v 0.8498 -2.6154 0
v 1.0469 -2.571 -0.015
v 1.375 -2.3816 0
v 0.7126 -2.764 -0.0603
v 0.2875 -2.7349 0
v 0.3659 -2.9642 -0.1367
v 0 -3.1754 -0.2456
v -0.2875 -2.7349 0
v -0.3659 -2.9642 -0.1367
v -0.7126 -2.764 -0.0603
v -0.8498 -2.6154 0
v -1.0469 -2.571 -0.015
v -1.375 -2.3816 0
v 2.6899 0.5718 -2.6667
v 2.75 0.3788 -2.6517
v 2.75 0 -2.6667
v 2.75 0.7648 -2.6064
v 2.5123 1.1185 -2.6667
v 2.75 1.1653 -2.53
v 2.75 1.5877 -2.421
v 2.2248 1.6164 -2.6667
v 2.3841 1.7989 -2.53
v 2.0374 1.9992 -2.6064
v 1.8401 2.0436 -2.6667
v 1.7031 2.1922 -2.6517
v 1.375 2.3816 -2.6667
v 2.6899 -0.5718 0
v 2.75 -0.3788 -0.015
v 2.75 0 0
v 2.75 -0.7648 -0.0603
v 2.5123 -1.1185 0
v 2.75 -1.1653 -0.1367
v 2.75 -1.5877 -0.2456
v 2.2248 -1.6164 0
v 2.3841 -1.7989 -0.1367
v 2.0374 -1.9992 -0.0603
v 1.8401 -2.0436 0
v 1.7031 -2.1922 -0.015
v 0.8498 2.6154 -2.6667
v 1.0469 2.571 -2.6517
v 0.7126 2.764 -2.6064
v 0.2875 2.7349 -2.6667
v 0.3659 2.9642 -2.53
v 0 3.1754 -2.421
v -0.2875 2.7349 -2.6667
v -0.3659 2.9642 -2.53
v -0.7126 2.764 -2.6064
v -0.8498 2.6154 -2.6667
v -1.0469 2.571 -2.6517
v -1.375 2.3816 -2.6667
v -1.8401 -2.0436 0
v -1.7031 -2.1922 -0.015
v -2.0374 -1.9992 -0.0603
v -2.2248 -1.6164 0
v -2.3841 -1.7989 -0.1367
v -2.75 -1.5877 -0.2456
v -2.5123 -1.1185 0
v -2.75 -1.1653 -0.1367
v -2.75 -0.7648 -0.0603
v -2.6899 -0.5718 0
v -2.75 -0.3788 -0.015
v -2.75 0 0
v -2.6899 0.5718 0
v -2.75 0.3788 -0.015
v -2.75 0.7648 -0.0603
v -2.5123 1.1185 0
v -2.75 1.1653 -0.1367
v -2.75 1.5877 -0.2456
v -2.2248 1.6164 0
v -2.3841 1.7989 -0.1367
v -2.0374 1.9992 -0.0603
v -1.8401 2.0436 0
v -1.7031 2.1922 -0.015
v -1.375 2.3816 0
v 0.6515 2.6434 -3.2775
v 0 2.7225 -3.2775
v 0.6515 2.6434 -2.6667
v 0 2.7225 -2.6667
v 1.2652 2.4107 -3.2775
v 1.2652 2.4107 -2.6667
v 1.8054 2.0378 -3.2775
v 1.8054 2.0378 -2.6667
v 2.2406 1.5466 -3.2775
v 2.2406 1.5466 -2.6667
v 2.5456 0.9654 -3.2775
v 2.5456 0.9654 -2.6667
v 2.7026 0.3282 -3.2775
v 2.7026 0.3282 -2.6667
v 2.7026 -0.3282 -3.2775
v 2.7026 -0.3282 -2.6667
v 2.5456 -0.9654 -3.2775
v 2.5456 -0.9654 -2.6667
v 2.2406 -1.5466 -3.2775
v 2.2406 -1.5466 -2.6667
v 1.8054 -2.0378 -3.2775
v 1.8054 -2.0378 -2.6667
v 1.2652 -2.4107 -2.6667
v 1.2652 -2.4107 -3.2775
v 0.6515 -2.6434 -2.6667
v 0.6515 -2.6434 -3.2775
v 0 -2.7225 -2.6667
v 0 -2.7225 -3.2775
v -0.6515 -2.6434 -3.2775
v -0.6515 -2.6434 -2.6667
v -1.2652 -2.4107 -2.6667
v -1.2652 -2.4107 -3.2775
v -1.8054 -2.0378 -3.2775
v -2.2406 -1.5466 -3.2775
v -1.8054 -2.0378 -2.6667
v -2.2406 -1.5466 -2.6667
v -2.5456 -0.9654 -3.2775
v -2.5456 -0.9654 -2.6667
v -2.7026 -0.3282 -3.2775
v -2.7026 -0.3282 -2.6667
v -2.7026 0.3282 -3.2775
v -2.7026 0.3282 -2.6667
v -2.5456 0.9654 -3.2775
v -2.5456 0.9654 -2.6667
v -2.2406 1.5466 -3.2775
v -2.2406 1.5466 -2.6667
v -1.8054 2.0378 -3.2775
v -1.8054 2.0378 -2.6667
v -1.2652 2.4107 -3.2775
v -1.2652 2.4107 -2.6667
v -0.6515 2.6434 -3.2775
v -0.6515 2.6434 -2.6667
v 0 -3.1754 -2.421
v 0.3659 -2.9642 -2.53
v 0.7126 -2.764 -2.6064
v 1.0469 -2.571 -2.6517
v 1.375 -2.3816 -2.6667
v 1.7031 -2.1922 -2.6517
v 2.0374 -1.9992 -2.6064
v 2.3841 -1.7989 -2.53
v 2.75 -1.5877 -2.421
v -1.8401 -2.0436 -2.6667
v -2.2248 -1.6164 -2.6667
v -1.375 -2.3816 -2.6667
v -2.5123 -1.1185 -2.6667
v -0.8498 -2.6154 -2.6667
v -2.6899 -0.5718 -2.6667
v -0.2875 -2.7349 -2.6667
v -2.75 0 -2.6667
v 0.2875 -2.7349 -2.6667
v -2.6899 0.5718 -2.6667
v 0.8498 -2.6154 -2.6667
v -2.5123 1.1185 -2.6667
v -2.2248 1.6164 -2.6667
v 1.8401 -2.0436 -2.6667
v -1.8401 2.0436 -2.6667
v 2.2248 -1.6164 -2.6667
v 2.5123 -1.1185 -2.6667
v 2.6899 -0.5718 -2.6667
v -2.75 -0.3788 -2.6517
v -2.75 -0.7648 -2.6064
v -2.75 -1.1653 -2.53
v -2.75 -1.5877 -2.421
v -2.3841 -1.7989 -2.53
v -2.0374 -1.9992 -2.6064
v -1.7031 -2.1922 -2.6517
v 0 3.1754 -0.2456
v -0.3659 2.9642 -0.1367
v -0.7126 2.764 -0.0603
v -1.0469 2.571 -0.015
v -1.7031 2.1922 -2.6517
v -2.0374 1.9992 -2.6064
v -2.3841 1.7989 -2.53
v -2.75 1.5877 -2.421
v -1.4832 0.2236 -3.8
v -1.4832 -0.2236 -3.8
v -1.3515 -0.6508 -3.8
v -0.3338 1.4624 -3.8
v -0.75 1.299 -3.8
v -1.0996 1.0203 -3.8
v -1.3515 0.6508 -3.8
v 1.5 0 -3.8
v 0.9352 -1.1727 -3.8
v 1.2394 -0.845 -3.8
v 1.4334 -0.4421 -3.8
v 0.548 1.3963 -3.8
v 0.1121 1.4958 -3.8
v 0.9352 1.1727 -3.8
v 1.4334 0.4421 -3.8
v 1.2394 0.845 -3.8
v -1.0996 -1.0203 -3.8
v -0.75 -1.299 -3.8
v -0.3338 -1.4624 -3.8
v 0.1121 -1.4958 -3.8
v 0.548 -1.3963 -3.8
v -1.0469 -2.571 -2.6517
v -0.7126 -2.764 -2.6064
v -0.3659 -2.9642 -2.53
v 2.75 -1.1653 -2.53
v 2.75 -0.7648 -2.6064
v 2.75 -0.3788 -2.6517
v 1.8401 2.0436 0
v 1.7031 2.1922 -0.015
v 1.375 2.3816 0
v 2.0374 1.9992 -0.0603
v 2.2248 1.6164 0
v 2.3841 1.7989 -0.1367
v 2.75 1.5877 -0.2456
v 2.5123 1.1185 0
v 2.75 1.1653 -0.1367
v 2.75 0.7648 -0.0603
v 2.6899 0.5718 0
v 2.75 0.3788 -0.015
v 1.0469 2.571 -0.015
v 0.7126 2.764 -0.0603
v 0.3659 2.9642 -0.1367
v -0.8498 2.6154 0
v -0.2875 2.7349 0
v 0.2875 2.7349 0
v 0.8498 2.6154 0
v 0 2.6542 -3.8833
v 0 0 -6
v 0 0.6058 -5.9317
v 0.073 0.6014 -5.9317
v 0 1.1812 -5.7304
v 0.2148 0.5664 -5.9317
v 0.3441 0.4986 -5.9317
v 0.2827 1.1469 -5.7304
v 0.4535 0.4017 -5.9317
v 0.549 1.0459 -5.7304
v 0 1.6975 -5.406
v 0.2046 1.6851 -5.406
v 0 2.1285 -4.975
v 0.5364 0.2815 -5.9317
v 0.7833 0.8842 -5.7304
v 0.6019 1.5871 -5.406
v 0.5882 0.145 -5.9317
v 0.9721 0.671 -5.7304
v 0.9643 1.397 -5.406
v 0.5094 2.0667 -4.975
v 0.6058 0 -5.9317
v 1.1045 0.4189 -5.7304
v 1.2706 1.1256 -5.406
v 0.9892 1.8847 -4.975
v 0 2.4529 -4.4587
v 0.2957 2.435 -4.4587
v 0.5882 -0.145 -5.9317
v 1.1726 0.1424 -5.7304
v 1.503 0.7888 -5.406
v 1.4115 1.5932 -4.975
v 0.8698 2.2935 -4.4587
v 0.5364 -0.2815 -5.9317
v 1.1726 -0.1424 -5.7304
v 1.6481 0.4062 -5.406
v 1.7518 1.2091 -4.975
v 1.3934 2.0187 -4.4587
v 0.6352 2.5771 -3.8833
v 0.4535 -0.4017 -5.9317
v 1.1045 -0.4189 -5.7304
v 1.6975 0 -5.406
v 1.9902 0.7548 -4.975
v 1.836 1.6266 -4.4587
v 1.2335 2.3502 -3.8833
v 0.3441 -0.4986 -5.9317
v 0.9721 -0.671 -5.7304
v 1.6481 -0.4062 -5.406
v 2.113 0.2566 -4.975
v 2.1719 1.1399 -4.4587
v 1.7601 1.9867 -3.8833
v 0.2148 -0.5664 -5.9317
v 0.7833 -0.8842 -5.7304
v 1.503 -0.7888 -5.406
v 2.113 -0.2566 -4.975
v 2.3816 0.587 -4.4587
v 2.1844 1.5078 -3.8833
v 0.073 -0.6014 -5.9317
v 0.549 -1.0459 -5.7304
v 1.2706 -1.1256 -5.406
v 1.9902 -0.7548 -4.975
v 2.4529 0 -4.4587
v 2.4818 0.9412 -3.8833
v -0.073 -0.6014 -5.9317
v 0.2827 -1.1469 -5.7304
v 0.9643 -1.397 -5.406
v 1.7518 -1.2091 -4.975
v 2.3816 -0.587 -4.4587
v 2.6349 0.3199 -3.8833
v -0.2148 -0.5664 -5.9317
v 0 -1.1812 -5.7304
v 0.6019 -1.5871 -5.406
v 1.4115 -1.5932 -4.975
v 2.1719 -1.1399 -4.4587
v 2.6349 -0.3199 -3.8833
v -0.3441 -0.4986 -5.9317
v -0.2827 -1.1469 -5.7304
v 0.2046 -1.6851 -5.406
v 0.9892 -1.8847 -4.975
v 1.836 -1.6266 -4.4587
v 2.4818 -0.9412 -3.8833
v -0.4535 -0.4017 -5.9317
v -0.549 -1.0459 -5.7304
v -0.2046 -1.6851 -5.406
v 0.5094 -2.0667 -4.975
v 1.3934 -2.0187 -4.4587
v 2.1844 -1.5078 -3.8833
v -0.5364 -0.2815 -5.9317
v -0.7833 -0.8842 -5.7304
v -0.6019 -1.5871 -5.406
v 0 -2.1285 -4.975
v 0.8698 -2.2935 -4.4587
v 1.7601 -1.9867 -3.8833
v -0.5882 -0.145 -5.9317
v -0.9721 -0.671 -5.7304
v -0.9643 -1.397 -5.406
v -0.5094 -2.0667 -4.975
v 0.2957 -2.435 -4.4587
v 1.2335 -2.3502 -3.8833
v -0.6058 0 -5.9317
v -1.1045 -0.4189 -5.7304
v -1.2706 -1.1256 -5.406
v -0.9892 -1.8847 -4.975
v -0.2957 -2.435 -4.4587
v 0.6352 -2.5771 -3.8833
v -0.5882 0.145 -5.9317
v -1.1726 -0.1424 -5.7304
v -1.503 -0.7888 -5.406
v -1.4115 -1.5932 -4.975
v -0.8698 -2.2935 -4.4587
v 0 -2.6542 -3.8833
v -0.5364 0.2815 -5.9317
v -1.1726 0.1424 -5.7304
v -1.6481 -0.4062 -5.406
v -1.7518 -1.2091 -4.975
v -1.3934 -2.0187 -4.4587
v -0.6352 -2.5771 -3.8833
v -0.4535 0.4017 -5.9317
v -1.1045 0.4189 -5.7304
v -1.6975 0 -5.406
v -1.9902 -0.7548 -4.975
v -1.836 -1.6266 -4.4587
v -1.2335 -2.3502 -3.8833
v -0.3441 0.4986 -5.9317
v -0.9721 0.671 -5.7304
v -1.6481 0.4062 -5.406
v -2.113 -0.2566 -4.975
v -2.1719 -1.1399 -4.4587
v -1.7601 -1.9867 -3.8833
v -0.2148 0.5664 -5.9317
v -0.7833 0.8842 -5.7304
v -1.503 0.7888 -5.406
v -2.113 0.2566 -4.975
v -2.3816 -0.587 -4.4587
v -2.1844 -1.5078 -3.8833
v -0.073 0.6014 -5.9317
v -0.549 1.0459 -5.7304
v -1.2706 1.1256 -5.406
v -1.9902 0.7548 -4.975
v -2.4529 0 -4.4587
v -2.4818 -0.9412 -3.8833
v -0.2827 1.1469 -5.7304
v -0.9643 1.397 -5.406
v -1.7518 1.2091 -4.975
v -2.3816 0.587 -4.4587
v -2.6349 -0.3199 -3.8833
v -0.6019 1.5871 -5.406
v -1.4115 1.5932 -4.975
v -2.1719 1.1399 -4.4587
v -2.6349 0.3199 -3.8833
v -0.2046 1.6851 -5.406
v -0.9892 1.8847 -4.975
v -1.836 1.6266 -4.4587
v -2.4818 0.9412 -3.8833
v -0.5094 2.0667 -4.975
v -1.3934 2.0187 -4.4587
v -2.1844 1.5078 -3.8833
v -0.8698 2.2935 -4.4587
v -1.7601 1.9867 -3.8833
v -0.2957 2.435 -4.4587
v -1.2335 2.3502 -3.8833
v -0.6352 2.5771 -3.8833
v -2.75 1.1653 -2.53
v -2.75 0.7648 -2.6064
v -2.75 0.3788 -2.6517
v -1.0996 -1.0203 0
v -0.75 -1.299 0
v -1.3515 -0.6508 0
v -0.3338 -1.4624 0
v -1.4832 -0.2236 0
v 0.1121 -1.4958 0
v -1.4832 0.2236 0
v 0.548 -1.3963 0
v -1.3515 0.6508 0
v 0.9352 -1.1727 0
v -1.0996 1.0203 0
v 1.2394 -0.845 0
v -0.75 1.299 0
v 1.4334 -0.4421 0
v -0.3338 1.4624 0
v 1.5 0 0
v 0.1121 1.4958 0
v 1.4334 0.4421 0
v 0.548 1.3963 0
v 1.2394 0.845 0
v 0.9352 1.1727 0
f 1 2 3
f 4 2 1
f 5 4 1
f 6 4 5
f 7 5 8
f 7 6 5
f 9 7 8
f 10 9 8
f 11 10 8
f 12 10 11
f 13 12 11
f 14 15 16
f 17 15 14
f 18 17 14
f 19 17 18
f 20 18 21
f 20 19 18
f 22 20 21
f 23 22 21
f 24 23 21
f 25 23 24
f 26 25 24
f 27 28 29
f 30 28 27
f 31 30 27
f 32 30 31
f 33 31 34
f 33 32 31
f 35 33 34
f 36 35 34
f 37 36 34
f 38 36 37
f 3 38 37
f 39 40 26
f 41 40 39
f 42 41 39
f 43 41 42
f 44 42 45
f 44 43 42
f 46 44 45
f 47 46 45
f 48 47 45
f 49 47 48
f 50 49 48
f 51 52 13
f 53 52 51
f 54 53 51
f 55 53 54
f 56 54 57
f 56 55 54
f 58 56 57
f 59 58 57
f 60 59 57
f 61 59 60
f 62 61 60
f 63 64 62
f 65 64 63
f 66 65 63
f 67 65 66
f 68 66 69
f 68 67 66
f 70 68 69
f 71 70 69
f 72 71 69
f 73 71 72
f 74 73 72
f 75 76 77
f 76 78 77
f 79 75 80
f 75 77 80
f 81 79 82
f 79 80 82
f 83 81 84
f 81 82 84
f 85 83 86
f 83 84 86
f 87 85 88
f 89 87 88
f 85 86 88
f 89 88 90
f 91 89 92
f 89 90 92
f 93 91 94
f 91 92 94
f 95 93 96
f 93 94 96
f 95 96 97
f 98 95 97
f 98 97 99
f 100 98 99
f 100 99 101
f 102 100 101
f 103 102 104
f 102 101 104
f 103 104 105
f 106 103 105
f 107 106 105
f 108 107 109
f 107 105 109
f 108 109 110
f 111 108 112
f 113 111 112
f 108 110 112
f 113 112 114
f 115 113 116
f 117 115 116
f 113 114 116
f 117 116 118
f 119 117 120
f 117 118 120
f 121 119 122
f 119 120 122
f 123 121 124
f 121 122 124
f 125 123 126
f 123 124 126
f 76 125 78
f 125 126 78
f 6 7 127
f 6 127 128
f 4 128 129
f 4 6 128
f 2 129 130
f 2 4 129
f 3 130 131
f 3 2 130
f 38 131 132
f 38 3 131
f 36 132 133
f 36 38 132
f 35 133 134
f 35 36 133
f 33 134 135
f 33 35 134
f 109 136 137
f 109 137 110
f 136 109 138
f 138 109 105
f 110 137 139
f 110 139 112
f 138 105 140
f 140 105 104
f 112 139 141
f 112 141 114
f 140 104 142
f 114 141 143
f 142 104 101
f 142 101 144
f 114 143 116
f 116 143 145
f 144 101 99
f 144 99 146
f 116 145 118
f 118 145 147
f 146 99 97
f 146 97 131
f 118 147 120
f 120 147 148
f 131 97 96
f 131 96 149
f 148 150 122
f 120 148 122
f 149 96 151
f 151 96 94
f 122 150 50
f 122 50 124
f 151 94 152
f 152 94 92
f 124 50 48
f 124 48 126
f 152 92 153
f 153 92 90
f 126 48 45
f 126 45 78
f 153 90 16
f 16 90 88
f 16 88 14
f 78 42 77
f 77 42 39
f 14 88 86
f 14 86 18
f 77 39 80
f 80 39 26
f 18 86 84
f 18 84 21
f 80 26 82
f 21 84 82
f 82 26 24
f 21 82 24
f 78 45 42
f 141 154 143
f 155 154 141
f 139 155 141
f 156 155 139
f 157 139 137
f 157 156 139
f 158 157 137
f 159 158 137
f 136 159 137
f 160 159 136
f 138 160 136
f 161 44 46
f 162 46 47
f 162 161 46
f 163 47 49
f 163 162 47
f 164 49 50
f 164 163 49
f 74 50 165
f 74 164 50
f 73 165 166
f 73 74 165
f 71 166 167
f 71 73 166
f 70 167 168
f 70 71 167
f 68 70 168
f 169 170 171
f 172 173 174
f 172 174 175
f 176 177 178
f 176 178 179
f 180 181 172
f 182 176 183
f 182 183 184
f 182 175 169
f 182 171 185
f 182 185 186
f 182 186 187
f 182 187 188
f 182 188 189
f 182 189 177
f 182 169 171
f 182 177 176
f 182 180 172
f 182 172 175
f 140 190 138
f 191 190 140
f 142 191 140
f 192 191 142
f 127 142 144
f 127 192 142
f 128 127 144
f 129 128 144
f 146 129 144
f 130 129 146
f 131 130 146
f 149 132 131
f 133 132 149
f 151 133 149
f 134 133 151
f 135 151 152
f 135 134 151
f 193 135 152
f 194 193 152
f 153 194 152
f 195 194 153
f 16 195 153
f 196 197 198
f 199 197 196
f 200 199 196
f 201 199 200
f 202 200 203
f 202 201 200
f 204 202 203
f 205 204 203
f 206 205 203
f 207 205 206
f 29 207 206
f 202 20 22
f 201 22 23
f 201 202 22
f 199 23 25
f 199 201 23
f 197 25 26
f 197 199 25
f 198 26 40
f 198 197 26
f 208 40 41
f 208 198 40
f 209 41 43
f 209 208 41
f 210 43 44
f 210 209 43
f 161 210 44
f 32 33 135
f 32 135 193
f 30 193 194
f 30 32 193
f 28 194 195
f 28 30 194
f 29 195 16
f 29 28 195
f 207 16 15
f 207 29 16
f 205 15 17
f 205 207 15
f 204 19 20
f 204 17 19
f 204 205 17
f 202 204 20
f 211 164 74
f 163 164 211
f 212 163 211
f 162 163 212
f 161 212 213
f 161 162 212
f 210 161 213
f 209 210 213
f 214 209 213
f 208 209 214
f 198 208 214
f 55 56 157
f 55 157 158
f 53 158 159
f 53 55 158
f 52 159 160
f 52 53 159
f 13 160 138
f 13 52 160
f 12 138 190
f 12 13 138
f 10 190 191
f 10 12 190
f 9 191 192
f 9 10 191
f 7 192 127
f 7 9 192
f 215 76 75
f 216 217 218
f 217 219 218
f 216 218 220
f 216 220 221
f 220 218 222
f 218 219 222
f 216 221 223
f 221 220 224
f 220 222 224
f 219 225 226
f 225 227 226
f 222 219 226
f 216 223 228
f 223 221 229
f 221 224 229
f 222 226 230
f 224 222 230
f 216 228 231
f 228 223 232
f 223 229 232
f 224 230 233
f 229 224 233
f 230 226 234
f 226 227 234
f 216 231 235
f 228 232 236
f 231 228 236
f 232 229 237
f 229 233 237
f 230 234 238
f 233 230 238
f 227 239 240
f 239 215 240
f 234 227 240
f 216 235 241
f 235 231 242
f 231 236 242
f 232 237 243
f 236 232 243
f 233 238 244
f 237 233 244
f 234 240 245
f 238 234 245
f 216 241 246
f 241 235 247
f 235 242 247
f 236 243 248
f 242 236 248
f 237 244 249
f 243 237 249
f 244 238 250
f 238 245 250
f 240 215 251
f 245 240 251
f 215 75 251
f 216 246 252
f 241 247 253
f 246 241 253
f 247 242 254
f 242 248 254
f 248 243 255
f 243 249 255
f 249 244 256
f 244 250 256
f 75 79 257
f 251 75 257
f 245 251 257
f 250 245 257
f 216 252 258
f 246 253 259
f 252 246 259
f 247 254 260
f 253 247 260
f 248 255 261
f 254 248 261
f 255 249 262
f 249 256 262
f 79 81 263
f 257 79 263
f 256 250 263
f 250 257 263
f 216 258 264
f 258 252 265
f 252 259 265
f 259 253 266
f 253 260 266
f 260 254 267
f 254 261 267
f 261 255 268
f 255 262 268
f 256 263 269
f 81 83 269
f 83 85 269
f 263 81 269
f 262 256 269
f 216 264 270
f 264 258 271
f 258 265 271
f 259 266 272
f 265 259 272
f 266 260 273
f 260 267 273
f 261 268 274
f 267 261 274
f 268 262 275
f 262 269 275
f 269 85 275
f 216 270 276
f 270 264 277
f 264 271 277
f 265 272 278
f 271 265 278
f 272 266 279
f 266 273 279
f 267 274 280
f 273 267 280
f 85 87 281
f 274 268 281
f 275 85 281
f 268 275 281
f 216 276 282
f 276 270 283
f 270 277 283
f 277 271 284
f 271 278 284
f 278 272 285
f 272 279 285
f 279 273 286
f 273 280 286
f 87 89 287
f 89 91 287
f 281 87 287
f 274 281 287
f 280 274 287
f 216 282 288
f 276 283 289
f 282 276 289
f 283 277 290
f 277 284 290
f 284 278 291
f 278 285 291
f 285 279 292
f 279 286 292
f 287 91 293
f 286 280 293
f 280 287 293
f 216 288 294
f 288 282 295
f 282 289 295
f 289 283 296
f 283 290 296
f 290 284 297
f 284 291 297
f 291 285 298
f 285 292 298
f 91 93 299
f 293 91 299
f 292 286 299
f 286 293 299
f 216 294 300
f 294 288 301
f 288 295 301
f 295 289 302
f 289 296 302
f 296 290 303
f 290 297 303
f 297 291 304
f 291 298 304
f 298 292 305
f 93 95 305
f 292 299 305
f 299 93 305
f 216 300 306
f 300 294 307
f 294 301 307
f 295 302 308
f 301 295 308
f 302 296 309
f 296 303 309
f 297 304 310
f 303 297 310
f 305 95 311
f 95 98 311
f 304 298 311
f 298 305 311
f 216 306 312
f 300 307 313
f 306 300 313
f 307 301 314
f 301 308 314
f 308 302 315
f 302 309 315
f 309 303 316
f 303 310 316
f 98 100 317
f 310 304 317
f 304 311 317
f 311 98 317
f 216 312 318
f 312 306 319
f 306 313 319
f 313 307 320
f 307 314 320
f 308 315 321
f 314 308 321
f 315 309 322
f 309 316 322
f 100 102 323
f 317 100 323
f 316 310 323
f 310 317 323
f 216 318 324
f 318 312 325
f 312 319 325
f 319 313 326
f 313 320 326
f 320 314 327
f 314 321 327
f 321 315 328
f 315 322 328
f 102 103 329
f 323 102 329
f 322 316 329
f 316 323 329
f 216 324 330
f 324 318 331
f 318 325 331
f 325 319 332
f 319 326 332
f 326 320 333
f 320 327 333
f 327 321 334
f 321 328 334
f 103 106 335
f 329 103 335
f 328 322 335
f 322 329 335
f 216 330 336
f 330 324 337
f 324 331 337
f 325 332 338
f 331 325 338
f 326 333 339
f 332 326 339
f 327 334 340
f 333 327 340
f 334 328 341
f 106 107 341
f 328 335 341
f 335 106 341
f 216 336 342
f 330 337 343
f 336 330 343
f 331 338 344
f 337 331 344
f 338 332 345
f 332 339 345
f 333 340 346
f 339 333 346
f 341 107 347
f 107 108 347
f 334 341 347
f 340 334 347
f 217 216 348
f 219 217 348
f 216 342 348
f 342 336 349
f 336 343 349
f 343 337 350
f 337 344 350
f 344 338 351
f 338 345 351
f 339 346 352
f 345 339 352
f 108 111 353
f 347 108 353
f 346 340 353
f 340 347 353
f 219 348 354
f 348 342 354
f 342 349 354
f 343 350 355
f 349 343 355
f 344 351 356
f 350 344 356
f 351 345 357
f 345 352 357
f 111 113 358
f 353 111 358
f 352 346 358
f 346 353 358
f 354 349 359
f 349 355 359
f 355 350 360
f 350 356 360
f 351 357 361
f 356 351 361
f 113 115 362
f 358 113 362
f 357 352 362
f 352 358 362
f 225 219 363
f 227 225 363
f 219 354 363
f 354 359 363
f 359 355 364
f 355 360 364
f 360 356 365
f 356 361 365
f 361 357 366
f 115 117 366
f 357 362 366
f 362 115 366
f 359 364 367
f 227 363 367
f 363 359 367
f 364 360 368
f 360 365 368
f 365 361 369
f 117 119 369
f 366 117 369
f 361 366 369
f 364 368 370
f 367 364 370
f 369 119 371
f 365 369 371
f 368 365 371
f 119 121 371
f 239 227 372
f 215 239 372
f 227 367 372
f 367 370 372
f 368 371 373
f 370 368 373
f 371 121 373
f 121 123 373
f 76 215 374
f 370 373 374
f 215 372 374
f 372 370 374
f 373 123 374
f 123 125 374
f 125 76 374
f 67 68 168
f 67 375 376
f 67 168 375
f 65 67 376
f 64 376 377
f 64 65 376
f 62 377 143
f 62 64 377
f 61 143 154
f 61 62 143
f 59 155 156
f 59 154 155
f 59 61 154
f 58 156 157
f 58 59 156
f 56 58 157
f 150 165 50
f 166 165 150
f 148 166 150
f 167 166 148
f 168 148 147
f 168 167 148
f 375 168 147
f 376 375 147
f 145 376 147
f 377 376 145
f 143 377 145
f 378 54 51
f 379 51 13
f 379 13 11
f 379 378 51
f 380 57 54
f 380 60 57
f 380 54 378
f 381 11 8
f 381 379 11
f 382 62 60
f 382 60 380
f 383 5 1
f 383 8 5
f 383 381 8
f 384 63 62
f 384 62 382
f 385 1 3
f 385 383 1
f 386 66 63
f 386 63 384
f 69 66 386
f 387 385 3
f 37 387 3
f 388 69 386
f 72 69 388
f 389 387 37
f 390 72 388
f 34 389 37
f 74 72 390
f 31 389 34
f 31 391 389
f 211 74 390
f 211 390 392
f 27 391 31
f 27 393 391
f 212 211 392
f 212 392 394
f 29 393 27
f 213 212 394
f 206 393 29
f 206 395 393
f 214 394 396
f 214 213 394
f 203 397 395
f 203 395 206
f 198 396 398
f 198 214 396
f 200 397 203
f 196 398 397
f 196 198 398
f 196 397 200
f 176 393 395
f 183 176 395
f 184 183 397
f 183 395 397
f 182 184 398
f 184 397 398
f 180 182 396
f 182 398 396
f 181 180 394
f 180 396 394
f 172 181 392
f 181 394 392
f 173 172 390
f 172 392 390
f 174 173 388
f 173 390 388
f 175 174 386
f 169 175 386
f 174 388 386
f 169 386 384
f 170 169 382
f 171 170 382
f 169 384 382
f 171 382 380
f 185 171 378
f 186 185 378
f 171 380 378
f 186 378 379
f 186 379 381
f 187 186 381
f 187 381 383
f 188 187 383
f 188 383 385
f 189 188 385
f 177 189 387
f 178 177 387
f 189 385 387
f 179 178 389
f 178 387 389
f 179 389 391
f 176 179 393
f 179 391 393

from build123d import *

# Parameters (mm, degrees)
EXTRUDE1_DEPTH     = 2.666666667
SKETCH2_OUTSIDE_W  = 21.964
SKETCH2_OUTSIDE_H  = 22.814
SKETCH2_OUTSIDE_R  = 2.75
CUT_EXTRUDE1_DEPTH = 3.666666667
CUT_EXTRUDE1_TAPER = 60
SKETCH3_OUTSIDE_W  = 21.964
SKETCH3_OUTSIDE_H  = 22.814
SKETCH3_OUTSIDE_R  = 2.75
CUT_EXTRUDE2_DEPTH = 3.666666667
CUT_EXTRUDE2_TAPER = 60
SKETCH4_R          = 1.5
CUT_EXTRUDE3_DEPTH = 3.8


with BuildPart() as part:
    # Sketch1 → Extrude1 (new body)
    with BuildSketch(Plane.XY):
        Polygon((0, 3.175426481), (-2.75, 1.58771324), (-2.75, -1.58771324), (0, -3.175426481), (2.75, -1.58771324), (2.75, 1.58771324), align=None)
    extrude(amount=-EXTRUDE1_DEPTH)

    # Sketch2 outside → Cut-Extrude1 (cut, through all)
    with BuildSketch(Plane.XY):
        Rectangle(SKETCH2_OUTSIDE_W, SKETCH2_OUTSIDE_H)
        Circle(SKETCH2_OUTSIDE_R, mode=Mode.SUBTRACT)
    extrude(amount=-CUT_EXTRUDE1_DEPTH, taper=CUT_EXTRUDE1_TAPER, mode=Mode.SUBTRACT)

    # Sketch3 outside → Cut-Extrude2 (cut, through all)
    with BuildSketch(Plane(origin=(0, 0, -2.666666667), x_dir=(-1, 0, 0), z_dir=(0, 0, -1))):
        Rectangle(SKETCH3_OUTSIDE_W, SKETCH3_OUTSIDE_H)
        Circle(SKETCH3_OUTSIDE_R, mode=Mode.SUBTRACT)
    extrude(amount=-CUT_EXTRUDE2_DEPTH, taper=CUT_EXTRUDE2_TAPER, mode=Mode.SUBTRACT)

    # Sketch14 → Revolve1 (revolve)
    with BuildSketch(Plane(origin=(0, 0, 0), x_dir=(0, 0, -1), z_dir=(1, 0, 0))):
        with BuildLine():
            Line((2.666666667, 2.7225), (2.666666667, 0))
            Line((2.666666667, 0), (6, 0))
            ThreePointArc((6, 0), (5.202598212, 1.925098212), (3.2775, 2.7225))
            Line((3.2775, 2.7225), (2.666666667, 2.7225))
        make_face()
    revolve(axis=Axis((0, 0, 0), (0, 0, -1)))

    # Sketch4 → Cut-Extrude3 (cut)
    with BuildSketch(Plane.XY):
        Circle(SKETCH4_R)
    extrude(amount=-CUT_EXTRUDE3_DEPTH, mode=Mode.SUBTRACT)


solid = part.part
